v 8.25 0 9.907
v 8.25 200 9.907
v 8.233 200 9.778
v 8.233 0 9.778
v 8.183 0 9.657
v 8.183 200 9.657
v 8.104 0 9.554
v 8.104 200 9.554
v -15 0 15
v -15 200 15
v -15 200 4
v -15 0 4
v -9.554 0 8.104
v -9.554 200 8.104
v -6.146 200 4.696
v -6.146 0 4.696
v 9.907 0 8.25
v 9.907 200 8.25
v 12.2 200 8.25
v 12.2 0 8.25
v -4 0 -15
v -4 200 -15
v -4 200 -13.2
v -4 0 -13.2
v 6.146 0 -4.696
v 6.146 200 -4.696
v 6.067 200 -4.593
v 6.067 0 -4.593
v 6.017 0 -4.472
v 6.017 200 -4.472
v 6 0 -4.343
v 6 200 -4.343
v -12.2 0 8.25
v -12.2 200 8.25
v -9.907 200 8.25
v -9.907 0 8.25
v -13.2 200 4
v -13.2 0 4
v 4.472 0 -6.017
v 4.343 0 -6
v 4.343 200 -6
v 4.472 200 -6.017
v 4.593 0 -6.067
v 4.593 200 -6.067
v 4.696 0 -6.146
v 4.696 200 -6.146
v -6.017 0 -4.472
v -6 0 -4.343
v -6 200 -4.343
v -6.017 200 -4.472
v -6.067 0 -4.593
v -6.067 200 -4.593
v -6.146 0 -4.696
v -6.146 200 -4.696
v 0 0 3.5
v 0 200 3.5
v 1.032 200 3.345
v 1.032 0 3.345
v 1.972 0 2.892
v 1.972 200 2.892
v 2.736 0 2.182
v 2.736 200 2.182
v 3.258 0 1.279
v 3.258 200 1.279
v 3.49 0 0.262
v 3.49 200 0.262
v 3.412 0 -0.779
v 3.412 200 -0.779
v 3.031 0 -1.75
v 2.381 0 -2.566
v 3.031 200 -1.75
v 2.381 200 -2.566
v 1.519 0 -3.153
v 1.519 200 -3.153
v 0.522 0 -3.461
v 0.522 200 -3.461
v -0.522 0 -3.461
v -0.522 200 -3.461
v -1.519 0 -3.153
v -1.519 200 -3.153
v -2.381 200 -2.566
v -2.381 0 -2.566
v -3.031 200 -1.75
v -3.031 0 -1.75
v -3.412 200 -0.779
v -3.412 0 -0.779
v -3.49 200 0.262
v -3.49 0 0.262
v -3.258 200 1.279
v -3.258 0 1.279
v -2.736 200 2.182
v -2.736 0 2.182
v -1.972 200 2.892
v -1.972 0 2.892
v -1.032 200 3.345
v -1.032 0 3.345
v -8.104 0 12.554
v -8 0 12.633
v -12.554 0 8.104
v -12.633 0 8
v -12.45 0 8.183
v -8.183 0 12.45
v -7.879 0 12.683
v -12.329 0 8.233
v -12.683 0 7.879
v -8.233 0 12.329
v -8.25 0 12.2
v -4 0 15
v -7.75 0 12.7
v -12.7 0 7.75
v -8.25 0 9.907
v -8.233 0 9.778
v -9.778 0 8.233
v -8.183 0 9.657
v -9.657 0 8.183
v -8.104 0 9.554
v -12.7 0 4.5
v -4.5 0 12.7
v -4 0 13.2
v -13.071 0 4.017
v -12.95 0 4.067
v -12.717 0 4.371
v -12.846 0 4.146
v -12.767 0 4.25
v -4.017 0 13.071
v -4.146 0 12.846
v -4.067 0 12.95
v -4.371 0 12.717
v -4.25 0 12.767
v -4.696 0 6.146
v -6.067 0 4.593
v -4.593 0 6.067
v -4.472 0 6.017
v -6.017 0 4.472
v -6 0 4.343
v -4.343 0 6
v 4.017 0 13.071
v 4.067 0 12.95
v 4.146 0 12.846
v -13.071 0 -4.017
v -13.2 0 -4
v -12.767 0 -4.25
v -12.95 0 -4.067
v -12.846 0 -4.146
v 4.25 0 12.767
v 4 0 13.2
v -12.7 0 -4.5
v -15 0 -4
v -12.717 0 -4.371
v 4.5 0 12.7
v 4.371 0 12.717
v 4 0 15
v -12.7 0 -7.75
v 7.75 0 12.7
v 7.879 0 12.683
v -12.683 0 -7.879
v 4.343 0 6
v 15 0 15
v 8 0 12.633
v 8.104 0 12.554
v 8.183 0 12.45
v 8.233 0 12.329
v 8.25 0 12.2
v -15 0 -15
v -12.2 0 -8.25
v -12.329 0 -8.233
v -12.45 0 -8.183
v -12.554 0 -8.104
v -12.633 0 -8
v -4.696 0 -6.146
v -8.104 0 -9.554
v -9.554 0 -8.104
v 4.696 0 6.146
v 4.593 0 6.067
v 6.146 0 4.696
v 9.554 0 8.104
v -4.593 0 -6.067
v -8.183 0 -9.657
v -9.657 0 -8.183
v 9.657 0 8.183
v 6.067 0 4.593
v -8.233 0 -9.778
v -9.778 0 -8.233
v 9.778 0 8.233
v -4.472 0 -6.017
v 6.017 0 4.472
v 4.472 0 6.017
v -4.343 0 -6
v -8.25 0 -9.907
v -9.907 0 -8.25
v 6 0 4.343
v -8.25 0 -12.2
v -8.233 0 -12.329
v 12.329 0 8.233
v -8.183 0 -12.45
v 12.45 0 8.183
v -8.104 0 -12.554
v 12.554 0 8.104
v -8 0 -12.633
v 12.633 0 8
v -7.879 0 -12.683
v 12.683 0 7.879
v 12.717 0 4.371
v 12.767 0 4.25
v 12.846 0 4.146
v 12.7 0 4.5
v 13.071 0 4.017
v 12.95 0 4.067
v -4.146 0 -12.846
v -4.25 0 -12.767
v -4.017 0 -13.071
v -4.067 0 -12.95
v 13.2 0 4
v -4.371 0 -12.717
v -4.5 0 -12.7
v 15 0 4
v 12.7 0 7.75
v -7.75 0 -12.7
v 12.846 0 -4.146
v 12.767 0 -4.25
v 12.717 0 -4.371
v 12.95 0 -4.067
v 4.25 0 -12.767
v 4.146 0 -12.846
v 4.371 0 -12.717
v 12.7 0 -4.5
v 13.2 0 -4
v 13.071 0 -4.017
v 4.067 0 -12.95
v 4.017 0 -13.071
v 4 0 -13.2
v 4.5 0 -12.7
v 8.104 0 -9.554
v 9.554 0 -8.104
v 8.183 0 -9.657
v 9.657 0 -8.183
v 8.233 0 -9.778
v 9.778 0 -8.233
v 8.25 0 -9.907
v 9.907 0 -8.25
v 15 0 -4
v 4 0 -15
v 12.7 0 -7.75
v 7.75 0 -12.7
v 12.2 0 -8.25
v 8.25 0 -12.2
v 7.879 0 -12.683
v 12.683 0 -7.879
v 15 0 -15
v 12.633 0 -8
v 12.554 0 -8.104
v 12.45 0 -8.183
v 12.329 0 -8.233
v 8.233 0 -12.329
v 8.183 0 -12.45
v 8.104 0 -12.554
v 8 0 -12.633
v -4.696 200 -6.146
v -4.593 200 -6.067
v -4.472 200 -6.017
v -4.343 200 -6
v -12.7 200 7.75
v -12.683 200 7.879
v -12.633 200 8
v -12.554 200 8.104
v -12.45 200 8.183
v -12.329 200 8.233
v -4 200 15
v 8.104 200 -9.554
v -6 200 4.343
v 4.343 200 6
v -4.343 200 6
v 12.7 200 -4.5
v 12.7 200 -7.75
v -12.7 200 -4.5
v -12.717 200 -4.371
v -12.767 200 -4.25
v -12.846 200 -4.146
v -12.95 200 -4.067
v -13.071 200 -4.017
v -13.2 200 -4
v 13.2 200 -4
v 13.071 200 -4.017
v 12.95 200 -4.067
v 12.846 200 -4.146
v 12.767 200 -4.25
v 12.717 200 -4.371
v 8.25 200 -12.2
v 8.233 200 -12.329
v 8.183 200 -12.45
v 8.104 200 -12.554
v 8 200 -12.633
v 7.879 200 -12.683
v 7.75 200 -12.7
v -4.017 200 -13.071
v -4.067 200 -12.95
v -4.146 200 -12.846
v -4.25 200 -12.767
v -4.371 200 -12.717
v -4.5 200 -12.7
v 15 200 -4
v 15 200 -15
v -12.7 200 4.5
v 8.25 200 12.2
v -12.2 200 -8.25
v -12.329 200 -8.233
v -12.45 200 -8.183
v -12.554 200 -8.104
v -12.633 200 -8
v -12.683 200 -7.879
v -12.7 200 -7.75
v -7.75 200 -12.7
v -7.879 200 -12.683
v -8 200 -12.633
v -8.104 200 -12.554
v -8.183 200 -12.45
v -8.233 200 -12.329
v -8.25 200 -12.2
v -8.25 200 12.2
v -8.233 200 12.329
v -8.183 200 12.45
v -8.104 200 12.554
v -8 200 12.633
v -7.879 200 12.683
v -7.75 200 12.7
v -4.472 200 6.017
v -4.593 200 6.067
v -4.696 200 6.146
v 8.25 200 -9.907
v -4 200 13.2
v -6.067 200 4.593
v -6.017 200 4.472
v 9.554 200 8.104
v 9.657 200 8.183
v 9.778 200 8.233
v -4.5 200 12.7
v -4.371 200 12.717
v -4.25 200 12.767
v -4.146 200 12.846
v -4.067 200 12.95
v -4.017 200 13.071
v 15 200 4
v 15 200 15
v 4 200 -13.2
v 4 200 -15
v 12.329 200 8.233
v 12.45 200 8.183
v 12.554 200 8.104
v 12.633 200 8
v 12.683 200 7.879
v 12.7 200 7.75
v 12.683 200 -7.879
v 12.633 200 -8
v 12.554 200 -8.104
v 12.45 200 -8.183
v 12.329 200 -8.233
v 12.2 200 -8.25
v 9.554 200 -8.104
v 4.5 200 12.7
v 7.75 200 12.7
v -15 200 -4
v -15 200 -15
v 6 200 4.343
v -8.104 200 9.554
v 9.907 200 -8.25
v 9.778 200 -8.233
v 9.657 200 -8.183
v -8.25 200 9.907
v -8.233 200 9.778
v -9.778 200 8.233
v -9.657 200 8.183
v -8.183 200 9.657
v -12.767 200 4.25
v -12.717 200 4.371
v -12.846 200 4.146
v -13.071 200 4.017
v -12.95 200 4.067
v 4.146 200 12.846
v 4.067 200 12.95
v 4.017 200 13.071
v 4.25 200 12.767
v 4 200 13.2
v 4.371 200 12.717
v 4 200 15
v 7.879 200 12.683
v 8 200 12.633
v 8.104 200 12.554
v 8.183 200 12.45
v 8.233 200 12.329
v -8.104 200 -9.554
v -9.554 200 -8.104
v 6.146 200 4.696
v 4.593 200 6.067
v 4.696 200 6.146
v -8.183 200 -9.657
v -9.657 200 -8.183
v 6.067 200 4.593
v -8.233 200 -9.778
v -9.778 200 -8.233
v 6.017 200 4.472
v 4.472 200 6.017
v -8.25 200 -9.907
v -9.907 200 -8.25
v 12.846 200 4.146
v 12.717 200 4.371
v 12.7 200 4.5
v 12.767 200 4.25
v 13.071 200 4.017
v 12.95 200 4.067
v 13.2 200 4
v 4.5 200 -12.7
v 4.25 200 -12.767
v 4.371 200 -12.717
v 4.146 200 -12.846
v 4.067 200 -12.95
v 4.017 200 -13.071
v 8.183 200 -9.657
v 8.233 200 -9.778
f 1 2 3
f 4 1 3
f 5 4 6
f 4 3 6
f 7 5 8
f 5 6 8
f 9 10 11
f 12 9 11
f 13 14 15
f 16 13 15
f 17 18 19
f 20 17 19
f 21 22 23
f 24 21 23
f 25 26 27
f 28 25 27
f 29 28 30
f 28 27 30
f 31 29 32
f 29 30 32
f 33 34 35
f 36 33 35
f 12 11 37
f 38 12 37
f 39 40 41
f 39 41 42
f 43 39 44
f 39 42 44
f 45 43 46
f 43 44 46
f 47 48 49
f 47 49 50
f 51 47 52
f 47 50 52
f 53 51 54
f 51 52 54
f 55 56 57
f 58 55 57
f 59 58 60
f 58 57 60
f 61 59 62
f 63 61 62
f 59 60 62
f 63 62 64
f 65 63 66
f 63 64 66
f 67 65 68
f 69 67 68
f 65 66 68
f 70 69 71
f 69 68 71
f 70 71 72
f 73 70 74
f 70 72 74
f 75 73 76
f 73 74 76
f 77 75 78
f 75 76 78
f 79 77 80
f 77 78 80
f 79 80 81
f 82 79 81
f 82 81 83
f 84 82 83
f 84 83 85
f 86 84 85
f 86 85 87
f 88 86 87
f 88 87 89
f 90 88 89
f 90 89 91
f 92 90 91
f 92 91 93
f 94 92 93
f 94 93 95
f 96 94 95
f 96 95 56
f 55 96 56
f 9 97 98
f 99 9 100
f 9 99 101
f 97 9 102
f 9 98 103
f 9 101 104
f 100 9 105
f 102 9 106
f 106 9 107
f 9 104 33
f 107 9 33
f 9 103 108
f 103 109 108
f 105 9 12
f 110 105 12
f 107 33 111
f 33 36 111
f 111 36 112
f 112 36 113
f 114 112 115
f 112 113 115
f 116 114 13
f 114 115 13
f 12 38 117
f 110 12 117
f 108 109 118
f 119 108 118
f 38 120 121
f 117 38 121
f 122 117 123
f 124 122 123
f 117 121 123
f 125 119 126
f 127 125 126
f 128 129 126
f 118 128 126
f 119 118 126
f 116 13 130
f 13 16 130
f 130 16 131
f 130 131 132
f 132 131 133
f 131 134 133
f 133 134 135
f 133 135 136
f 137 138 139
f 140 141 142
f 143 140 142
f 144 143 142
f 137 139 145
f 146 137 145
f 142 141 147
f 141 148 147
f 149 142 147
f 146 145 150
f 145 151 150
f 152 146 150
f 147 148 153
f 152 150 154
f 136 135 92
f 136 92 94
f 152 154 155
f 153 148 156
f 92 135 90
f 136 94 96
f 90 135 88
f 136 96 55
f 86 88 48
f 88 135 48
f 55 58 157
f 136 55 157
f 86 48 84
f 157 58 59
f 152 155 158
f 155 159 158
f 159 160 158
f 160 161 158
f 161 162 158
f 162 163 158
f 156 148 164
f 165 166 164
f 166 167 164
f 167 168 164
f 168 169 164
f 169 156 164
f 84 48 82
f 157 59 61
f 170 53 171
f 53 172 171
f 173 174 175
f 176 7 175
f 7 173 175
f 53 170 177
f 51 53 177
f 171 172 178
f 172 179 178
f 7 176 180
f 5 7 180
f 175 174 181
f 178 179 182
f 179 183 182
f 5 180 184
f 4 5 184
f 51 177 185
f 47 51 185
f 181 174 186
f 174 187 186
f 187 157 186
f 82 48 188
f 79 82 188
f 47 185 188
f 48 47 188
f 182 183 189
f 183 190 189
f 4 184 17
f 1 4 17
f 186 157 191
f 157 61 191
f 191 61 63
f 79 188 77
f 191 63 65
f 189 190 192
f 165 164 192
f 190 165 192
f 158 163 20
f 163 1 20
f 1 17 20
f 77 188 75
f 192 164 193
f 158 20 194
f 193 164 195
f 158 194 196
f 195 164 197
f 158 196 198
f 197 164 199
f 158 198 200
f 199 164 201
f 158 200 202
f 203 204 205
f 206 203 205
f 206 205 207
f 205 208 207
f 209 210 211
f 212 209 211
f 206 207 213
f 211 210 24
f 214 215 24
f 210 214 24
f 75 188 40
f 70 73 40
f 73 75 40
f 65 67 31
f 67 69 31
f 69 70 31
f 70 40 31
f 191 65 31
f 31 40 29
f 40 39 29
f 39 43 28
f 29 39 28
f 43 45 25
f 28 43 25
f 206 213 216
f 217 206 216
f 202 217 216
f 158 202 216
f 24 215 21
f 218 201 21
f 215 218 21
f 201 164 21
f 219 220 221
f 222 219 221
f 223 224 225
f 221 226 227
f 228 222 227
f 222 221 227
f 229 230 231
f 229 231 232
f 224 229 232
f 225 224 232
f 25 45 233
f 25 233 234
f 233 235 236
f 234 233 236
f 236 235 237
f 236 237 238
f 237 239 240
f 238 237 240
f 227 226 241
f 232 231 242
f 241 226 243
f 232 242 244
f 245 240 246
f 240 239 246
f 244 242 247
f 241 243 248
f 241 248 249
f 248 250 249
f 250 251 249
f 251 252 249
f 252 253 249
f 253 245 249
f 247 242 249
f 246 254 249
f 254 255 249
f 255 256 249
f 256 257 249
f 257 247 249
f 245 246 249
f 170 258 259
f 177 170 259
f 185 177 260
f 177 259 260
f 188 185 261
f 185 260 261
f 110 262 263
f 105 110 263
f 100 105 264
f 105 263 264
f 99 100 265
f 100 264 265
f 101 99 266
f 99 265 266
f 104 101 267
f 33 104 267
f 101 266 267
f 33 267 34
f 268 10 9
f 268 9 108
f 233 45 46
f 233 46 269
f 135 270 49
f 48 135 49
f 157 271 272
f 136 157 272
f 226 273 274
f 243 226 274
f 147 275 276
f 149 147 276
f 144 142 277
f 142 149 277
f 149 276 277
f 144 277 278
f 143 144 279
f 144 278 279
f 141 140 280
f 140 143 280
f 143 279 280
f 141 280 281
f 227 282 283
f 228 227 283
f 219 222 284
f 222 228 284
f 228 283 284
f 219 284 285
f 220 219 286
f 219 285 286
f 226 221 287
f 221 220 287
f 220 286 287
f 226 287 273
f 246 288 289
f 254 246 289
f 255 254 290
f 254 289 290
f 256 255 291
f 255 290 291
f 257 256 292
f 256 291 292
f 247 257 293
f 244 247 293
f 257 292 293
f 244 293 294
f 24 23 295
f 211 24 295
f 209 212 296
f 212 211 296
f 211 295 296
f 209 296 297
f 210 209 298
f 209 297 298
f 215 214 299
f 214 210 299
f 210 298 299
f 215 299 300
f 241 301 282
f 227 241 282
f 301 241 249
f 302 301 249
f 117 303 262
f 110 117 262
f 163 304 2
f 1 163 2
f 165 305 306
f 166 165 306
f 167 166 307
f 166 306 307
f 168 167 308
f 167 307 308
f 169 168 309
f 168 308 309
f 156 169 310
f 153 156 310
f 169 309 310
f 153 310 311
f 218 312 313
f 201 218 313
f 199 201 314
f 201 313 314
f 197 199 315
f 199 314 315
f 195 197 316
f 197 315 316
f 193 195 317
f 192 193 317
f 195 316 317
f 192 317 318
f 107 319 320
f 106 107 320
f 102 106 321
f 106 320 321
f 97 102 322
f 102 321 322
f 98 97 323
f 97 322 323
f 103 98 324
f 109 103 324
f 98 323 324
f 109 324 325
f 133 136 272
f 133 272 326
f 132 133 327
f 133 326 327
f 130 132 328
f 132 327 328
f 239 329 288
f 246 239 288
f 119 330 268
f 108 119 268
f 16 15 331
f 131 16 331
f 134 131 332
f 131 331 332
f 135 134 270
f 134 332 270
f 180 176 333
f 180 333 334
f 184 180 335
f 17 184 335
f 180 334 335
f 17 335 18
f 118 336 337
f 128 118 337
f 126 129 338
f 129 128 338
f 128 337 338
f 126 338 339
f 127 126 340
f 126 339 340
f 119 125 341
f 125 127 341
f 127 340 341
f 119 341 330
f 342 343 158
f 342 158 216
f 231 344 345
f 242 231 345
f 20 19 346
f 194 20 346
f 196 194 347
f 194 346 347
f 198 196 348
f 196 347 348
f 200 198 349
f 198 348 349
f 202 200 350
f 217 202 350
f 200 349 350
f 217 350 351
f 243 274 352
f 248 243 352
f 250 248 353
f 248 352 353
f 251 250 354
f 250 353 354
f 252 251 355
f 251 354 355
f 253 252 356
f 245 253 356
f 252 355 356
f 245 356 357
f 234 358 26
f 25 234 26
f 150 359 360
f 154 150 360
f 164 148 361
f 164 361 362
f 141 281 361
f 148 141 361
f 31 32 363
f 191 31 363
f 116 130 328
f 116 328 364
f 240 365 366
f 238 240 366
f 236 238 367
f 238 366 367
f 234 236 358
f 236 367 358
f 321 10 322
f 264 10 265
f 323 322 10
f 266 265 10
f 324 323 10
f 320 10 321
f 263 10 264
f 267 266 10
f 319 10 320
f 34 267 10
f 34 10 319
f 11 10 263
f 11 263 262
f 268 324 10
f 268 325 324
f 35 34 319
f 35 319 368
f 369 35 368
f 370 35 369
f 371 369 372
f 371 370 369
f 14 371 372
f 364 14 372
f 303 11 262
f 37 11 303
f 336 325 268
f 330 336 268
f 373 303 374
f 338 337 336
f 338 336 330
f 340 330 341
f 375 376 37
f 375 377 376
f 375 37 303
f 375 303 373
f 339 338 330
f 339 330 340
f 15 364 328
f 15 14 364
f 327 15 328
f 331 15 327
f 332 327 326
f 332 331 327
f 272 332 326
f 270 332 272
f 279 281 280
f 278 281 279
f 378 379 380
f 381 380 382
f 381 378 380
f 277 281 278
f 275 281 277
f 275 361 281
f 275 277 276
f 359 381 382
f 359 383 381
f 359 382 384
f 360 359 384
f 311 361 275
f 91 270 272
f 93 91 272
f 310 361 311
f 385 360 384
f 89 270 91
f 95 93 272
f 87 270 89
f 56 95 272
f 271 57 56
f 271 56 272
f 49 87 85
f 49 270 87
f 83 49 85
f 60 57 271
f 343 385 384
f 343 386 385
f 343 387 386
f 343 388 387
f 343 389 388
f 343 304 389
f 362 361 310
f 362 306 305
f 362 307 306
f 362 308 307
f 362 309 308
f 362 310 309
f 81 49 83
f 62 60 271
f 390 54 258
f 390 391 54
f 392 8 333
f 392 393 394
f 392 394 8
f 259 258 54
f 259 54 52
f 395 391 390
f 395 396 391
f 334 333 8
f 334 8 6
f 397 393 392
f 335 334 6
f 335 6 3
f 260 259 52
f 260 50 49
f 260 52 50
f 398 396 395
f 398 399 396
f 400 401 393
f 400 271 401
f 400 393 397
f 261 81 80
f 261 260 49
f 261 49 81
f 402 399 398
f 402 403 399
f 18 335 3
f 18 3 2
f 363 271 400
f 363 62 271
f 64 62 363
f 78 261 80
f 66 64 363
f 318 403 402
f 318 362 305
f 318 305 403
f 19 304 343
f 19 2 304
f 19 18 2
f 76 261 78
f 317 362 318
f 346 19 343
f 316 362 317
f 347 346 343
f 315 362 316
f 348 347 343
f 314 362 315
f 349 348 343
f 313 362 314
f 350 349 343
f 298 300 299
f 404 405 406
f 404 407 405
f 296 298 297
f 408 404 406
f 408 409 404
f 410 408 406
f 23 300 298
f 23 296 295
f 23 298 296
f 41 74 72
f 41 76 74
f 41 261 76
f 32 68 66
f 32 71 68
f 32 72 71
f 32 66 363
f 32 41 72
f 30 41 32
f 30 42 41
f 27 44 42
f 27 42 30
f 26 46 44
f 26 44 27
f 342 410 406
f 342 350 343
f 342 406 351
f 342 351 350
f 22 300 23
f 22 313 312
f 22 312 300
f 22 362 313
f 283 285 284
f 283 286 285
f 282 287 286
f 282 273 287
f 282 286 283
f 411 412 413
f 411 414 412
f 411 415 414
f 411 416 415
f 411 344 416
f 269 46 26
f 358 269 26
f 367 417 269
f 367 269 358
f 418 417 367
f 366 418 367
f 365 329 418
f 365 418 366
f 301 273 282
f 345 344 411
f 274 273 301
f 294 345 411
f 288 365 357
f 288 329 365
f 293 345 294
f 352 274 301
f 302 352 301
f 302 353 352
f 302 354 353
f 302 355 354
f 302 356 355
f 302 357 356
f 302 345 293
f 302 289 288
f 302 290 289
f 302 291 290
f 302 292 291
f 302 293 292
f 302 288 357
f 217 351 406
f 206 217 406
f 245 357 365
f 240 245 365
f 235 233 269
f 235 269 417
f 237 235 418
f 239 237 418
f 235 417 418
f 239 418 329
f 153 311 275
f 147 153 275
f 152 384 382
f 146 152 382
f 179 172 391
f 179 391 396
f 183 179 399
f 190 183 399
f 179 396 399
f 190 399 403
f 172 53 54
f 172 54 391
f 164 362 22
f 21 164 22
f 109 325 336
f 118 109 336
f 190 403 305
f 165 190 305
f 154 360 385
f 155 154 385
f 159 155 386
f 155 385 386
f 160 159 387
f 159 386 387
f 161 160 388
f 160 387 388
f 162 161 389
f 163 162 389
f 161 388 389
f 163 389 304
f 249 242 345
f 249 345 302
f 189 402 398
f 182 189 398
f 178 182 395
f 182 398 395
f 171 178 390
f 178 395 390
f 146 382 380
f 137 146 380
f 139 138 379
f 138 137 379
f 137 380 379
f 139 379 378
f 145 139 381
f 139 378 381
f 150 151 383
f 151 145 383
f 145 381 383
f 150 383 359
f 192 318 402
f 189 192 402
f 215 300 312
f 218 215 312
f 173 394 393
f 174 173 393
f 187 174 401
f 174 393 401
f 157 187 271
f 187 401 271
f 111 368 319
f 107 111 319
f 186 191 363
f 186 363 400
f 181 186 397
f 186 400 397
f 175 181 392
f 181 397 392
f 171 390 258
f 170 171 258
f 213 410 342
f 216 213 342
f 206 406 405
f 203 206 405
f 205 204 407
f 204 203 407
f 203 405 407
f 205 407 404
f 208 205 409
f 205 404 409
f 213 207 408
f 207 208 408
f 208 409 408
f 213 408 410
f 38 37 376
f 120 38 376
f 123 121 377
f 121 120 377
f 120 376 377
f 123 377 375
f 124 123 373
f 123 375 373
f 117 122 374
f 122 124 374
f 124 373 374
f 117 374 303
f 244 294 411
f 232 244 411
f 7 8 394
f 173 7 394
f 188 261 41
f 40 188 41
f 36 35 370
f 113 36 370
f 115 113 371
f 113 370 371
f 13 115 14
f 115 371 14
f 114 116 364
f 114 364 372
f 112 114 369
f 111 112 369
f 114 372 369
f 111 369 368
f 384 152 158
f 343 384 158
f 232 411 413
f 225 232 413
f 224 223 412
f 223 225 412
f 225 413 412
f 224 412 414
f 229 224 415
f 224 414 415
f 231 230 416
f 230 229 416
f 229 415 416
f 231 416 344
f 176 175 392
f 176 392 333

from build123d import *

# Parameters (mm, degrees)
CROQUIS1_W              = 30
CROQUIS1_H              = 30
SALIENTE_EXTRUIR1_DEPTH = 200
CROQUIS3_R              = 3.5
CORTAR_EXTRUIR2_DEPTH   = 202.121853611


with BuildPart() as part:
    # Croquis1 → Saliente-Extruir1 (new body)
    with BuildSketch(Plane(origin=(0, 0, 0), x_dir=(1, 0, 0), z_dir=(0, 1, 0))):
        Rectangle(CROQUIS1_W, CROQUIS1_H)
    extrude(amount=SALIENTE_EXTRUIR1_DEPTH)

    # Croquis3 → Cortar-Extruir2 (cut, through all)
    with BuildSketch(Plane(origin=(0, 200, 0), x_dir=(1, 0, 0), z_dir=(0, 1, 0))):
        with Locations(Location((0, 0, 0), (0, 0, 270))):
            Circle(CROQUIS3_R)
        with BuildLine():
            Line((4, 15), (-4, 15))
            Line((-4, 15), (-4, 13.2))
            ThreePointArc((-4, 13.2), (-4.146446609, 12.846446609), (-4.5, 12.7))
            Line((-4.5, 12.7), (-7.75, 12.7))
            ThreePointArc((-7.75, 12.7), (-8.103553391, 12.553553391), (-8.25, 12.2))
            Line((-8.25, 12.2), (-8.25, 9.907106781))
            ThreePointArc((-8.25, 9.907106781), (-8.211939766, 9.715765065), (-8.103553391, 9.553553391))
            Line((-8.103553391, 9.553553391), (-4.696446609, 6.146446609))
            ThreePointArc((-4.696446609, 6.146446609), (-4.534234935, 6.038060234), (-4.342893219, 6))
            Line((-4.342893219, 6), (4.342893219, 6))
            ThreePointArc((4.342893219, 6), (4.534234935, 6.038060234), (4.696446609, 6.146446609))
            Line((4.696446609, 6.146446609), (8.103553391, 9.553553391))
            ThreePointArc((8.103553391, 9.553553391), (8.211939766, 9.715765065), (8.25, 9.907106781))
            Line((8.25, 9.907106781), (8.25, 12.2))
            ThreePointArc((8.25, 12.2), (8.103553391, 12.553553391), (7.75, 12.7))
            Line((7.75, 12.7), (4.5, 12.7))
            ThreePointArc((4.5, 12.7), (4.146446609, 12.846446609), (4, 13.2))
            Line((4, 13.2), (4, 15))
        make_face()
        with BuildLine():
            Line((6, 4.342893219), (6, -4.342893219))
            ThreePointArc((6, -4.342893219), (6.038060234, -4.534234935), (6.146446609, -4.696446609))
            Line((6.146446609, -4.696446609), (9.553553391, -8.103553391))
            ThreePointArc((9.553553391, -8.103553391), (9.715765065, -8.211939766), (9.907106781, -8.25))
            Line((9.907106781, -8.25), (12.2, -8.25))
            ThreePointArc((12.2, -8.25), (12.553553391, -8.103553391), (12.7, -7.75))
            Line((12.7, -7.75), (12.7, -4.5))
            ThreePointArc((12.7, -4.5), (12.846446609, -4.146446609), (13.2, -4))
            Line((13.2, -4), (15, -4))
            Line((15, -4), (15, 4))
            Line((15, 4), (13.2, 4))
            ThreePointArc((13.2, 4), (12.846446609, 4.146446609), (12.7, 4.5))
            Line((12.7, 4.5), (12.7, 7.75))
            ThreePointArc((12.7, 7.75), (12.553553391, 8.103553391), (12.2, 8.25))
            Line((12.2, 8.25), (9.907106781, 8.25))
            ThreePointArc((9.907106781, 8.25), (9.715765065, 8.211939766), (9.553553391, 8.103553391))
            Line((9.553553391, 8.103553391), (6.146446609, 4.696446609))
            ThreePointArc((6.146446609, 4.696446609), (6.038060234, 4.534234935), (6, 4.342893219))
        make_face()
        with BuildLine():
            Line((4.342893219, -6), (-4.342893219, -6))
            ThreePointArc((-4.342893219, -6), (-4.534234935, -6.038060234), (-4.696446609, -6.146446609))
            Line((-4.696446609, -6.146446609), (-8.103553391, -9.553553391))
            ThreePointArc((-8.103553391, -9.553553391), (-8.211939766, -9.715765065), (-8.25, -9.907106781))
            Line((-8.25, -9.907106781), (-8.25, -12.2))
            ThreePointArc((-8.25, -12.2), (-8.103553391, -12.553553391), (-7.75, -12.7))
            Line((-7.75, -12.7), (-4.5, -12.7))
            ThreePointArc((-4.5, -12.7), (-4.146446609, -12.846446609), (-4, -13.2))
            Line((-4, -13.2), (-4, -15))
            Line((-4, -15), (4, -15))
            Line((4, -15), (4, -13.2))
            ThreePointArc((4, -13.2), (4.146446609, -12.846446609), (4.5, -12.7))
            Line((4.5, -12.7), (7.75, -12.7))
            ThreePointArc((7.75, -12.7), (8.103553391, -12.553553391), (8.25, -12.2))
            Line((8.25, -12.2), (8.25, -9.907106781))
            ThreePointArc((8.25, -9.907106781), (8.211939766, -9.715765065), (8.103553391, -9.553553391))
            Line((8.103553391, -9.553553391), (4.696446609, -6.146446609))
            ThreePointArc((4.696446609, -6.146446609), (4.534234935, -6.038060234), (4.342893219, -6))
        make_face()
        with BuildLine():
            Line((-6, -4.342893219), (-6, 4.342893219))
            ThreePointArc((-6, 4.342893219), (-6.038060234, 4.534234935), (-6.146446609, 4.696446609))
            Line((-6.146446609, 4.696446609), (-9.553553391, 8.103553391))
            ThreePointArc((-9.553553391, 8.103553391), (-9.715765065, 8.211939766), (-9.907106781, 8.25))
            Line((-9.907106781, 8.25), (-12.2, 8.25))
            ThreePointArc((-12.2, 8.25), (-12.553553391, 8.103553391), (-12.7, 7.75))
            Line((-12.7, 7.75), (-12.7, 4.5))
            ThreePointArc((-12.7, 4.5), (-12.846446609, 4.146446609), (-13.2, 4))
            Line((-13.2, 4), (-15, 4))
            Line((-15, 4), (-15, -4))
            Line((-15, -4), (-13.2, -4))
            ThreePointArc((-13.2, -4), (-12.846446609, -4.146446609), (-12.7, -4.5))
            Line((-12.7, -4.5), (-12.7, -7.75))
            ThreePointArc((-12.7, -7.75), (-12.553553391, -8.103553391), (-12.2, -8.25))
            Line((-12.2, -8.25), (-9.907106781, -8.25))
            ThreePointArc((-9.907106781, -8.25), (-9.715765065, -8.211939766), (-9.553553391, -8.103553391))
            Line((-9.553553391, -8.103553391), (-6.146446609, -4.696446609))
            ThreePointArc((-6.146446609, -4.696446609), (-6.038060234, -4.534234935), (-6, -4.342893219))
        make_face()
    extrude(amount=-CORTAR_EXTRUIR2_DEPTH, mode=Mode.SUBTRACT)


solid = part.part
